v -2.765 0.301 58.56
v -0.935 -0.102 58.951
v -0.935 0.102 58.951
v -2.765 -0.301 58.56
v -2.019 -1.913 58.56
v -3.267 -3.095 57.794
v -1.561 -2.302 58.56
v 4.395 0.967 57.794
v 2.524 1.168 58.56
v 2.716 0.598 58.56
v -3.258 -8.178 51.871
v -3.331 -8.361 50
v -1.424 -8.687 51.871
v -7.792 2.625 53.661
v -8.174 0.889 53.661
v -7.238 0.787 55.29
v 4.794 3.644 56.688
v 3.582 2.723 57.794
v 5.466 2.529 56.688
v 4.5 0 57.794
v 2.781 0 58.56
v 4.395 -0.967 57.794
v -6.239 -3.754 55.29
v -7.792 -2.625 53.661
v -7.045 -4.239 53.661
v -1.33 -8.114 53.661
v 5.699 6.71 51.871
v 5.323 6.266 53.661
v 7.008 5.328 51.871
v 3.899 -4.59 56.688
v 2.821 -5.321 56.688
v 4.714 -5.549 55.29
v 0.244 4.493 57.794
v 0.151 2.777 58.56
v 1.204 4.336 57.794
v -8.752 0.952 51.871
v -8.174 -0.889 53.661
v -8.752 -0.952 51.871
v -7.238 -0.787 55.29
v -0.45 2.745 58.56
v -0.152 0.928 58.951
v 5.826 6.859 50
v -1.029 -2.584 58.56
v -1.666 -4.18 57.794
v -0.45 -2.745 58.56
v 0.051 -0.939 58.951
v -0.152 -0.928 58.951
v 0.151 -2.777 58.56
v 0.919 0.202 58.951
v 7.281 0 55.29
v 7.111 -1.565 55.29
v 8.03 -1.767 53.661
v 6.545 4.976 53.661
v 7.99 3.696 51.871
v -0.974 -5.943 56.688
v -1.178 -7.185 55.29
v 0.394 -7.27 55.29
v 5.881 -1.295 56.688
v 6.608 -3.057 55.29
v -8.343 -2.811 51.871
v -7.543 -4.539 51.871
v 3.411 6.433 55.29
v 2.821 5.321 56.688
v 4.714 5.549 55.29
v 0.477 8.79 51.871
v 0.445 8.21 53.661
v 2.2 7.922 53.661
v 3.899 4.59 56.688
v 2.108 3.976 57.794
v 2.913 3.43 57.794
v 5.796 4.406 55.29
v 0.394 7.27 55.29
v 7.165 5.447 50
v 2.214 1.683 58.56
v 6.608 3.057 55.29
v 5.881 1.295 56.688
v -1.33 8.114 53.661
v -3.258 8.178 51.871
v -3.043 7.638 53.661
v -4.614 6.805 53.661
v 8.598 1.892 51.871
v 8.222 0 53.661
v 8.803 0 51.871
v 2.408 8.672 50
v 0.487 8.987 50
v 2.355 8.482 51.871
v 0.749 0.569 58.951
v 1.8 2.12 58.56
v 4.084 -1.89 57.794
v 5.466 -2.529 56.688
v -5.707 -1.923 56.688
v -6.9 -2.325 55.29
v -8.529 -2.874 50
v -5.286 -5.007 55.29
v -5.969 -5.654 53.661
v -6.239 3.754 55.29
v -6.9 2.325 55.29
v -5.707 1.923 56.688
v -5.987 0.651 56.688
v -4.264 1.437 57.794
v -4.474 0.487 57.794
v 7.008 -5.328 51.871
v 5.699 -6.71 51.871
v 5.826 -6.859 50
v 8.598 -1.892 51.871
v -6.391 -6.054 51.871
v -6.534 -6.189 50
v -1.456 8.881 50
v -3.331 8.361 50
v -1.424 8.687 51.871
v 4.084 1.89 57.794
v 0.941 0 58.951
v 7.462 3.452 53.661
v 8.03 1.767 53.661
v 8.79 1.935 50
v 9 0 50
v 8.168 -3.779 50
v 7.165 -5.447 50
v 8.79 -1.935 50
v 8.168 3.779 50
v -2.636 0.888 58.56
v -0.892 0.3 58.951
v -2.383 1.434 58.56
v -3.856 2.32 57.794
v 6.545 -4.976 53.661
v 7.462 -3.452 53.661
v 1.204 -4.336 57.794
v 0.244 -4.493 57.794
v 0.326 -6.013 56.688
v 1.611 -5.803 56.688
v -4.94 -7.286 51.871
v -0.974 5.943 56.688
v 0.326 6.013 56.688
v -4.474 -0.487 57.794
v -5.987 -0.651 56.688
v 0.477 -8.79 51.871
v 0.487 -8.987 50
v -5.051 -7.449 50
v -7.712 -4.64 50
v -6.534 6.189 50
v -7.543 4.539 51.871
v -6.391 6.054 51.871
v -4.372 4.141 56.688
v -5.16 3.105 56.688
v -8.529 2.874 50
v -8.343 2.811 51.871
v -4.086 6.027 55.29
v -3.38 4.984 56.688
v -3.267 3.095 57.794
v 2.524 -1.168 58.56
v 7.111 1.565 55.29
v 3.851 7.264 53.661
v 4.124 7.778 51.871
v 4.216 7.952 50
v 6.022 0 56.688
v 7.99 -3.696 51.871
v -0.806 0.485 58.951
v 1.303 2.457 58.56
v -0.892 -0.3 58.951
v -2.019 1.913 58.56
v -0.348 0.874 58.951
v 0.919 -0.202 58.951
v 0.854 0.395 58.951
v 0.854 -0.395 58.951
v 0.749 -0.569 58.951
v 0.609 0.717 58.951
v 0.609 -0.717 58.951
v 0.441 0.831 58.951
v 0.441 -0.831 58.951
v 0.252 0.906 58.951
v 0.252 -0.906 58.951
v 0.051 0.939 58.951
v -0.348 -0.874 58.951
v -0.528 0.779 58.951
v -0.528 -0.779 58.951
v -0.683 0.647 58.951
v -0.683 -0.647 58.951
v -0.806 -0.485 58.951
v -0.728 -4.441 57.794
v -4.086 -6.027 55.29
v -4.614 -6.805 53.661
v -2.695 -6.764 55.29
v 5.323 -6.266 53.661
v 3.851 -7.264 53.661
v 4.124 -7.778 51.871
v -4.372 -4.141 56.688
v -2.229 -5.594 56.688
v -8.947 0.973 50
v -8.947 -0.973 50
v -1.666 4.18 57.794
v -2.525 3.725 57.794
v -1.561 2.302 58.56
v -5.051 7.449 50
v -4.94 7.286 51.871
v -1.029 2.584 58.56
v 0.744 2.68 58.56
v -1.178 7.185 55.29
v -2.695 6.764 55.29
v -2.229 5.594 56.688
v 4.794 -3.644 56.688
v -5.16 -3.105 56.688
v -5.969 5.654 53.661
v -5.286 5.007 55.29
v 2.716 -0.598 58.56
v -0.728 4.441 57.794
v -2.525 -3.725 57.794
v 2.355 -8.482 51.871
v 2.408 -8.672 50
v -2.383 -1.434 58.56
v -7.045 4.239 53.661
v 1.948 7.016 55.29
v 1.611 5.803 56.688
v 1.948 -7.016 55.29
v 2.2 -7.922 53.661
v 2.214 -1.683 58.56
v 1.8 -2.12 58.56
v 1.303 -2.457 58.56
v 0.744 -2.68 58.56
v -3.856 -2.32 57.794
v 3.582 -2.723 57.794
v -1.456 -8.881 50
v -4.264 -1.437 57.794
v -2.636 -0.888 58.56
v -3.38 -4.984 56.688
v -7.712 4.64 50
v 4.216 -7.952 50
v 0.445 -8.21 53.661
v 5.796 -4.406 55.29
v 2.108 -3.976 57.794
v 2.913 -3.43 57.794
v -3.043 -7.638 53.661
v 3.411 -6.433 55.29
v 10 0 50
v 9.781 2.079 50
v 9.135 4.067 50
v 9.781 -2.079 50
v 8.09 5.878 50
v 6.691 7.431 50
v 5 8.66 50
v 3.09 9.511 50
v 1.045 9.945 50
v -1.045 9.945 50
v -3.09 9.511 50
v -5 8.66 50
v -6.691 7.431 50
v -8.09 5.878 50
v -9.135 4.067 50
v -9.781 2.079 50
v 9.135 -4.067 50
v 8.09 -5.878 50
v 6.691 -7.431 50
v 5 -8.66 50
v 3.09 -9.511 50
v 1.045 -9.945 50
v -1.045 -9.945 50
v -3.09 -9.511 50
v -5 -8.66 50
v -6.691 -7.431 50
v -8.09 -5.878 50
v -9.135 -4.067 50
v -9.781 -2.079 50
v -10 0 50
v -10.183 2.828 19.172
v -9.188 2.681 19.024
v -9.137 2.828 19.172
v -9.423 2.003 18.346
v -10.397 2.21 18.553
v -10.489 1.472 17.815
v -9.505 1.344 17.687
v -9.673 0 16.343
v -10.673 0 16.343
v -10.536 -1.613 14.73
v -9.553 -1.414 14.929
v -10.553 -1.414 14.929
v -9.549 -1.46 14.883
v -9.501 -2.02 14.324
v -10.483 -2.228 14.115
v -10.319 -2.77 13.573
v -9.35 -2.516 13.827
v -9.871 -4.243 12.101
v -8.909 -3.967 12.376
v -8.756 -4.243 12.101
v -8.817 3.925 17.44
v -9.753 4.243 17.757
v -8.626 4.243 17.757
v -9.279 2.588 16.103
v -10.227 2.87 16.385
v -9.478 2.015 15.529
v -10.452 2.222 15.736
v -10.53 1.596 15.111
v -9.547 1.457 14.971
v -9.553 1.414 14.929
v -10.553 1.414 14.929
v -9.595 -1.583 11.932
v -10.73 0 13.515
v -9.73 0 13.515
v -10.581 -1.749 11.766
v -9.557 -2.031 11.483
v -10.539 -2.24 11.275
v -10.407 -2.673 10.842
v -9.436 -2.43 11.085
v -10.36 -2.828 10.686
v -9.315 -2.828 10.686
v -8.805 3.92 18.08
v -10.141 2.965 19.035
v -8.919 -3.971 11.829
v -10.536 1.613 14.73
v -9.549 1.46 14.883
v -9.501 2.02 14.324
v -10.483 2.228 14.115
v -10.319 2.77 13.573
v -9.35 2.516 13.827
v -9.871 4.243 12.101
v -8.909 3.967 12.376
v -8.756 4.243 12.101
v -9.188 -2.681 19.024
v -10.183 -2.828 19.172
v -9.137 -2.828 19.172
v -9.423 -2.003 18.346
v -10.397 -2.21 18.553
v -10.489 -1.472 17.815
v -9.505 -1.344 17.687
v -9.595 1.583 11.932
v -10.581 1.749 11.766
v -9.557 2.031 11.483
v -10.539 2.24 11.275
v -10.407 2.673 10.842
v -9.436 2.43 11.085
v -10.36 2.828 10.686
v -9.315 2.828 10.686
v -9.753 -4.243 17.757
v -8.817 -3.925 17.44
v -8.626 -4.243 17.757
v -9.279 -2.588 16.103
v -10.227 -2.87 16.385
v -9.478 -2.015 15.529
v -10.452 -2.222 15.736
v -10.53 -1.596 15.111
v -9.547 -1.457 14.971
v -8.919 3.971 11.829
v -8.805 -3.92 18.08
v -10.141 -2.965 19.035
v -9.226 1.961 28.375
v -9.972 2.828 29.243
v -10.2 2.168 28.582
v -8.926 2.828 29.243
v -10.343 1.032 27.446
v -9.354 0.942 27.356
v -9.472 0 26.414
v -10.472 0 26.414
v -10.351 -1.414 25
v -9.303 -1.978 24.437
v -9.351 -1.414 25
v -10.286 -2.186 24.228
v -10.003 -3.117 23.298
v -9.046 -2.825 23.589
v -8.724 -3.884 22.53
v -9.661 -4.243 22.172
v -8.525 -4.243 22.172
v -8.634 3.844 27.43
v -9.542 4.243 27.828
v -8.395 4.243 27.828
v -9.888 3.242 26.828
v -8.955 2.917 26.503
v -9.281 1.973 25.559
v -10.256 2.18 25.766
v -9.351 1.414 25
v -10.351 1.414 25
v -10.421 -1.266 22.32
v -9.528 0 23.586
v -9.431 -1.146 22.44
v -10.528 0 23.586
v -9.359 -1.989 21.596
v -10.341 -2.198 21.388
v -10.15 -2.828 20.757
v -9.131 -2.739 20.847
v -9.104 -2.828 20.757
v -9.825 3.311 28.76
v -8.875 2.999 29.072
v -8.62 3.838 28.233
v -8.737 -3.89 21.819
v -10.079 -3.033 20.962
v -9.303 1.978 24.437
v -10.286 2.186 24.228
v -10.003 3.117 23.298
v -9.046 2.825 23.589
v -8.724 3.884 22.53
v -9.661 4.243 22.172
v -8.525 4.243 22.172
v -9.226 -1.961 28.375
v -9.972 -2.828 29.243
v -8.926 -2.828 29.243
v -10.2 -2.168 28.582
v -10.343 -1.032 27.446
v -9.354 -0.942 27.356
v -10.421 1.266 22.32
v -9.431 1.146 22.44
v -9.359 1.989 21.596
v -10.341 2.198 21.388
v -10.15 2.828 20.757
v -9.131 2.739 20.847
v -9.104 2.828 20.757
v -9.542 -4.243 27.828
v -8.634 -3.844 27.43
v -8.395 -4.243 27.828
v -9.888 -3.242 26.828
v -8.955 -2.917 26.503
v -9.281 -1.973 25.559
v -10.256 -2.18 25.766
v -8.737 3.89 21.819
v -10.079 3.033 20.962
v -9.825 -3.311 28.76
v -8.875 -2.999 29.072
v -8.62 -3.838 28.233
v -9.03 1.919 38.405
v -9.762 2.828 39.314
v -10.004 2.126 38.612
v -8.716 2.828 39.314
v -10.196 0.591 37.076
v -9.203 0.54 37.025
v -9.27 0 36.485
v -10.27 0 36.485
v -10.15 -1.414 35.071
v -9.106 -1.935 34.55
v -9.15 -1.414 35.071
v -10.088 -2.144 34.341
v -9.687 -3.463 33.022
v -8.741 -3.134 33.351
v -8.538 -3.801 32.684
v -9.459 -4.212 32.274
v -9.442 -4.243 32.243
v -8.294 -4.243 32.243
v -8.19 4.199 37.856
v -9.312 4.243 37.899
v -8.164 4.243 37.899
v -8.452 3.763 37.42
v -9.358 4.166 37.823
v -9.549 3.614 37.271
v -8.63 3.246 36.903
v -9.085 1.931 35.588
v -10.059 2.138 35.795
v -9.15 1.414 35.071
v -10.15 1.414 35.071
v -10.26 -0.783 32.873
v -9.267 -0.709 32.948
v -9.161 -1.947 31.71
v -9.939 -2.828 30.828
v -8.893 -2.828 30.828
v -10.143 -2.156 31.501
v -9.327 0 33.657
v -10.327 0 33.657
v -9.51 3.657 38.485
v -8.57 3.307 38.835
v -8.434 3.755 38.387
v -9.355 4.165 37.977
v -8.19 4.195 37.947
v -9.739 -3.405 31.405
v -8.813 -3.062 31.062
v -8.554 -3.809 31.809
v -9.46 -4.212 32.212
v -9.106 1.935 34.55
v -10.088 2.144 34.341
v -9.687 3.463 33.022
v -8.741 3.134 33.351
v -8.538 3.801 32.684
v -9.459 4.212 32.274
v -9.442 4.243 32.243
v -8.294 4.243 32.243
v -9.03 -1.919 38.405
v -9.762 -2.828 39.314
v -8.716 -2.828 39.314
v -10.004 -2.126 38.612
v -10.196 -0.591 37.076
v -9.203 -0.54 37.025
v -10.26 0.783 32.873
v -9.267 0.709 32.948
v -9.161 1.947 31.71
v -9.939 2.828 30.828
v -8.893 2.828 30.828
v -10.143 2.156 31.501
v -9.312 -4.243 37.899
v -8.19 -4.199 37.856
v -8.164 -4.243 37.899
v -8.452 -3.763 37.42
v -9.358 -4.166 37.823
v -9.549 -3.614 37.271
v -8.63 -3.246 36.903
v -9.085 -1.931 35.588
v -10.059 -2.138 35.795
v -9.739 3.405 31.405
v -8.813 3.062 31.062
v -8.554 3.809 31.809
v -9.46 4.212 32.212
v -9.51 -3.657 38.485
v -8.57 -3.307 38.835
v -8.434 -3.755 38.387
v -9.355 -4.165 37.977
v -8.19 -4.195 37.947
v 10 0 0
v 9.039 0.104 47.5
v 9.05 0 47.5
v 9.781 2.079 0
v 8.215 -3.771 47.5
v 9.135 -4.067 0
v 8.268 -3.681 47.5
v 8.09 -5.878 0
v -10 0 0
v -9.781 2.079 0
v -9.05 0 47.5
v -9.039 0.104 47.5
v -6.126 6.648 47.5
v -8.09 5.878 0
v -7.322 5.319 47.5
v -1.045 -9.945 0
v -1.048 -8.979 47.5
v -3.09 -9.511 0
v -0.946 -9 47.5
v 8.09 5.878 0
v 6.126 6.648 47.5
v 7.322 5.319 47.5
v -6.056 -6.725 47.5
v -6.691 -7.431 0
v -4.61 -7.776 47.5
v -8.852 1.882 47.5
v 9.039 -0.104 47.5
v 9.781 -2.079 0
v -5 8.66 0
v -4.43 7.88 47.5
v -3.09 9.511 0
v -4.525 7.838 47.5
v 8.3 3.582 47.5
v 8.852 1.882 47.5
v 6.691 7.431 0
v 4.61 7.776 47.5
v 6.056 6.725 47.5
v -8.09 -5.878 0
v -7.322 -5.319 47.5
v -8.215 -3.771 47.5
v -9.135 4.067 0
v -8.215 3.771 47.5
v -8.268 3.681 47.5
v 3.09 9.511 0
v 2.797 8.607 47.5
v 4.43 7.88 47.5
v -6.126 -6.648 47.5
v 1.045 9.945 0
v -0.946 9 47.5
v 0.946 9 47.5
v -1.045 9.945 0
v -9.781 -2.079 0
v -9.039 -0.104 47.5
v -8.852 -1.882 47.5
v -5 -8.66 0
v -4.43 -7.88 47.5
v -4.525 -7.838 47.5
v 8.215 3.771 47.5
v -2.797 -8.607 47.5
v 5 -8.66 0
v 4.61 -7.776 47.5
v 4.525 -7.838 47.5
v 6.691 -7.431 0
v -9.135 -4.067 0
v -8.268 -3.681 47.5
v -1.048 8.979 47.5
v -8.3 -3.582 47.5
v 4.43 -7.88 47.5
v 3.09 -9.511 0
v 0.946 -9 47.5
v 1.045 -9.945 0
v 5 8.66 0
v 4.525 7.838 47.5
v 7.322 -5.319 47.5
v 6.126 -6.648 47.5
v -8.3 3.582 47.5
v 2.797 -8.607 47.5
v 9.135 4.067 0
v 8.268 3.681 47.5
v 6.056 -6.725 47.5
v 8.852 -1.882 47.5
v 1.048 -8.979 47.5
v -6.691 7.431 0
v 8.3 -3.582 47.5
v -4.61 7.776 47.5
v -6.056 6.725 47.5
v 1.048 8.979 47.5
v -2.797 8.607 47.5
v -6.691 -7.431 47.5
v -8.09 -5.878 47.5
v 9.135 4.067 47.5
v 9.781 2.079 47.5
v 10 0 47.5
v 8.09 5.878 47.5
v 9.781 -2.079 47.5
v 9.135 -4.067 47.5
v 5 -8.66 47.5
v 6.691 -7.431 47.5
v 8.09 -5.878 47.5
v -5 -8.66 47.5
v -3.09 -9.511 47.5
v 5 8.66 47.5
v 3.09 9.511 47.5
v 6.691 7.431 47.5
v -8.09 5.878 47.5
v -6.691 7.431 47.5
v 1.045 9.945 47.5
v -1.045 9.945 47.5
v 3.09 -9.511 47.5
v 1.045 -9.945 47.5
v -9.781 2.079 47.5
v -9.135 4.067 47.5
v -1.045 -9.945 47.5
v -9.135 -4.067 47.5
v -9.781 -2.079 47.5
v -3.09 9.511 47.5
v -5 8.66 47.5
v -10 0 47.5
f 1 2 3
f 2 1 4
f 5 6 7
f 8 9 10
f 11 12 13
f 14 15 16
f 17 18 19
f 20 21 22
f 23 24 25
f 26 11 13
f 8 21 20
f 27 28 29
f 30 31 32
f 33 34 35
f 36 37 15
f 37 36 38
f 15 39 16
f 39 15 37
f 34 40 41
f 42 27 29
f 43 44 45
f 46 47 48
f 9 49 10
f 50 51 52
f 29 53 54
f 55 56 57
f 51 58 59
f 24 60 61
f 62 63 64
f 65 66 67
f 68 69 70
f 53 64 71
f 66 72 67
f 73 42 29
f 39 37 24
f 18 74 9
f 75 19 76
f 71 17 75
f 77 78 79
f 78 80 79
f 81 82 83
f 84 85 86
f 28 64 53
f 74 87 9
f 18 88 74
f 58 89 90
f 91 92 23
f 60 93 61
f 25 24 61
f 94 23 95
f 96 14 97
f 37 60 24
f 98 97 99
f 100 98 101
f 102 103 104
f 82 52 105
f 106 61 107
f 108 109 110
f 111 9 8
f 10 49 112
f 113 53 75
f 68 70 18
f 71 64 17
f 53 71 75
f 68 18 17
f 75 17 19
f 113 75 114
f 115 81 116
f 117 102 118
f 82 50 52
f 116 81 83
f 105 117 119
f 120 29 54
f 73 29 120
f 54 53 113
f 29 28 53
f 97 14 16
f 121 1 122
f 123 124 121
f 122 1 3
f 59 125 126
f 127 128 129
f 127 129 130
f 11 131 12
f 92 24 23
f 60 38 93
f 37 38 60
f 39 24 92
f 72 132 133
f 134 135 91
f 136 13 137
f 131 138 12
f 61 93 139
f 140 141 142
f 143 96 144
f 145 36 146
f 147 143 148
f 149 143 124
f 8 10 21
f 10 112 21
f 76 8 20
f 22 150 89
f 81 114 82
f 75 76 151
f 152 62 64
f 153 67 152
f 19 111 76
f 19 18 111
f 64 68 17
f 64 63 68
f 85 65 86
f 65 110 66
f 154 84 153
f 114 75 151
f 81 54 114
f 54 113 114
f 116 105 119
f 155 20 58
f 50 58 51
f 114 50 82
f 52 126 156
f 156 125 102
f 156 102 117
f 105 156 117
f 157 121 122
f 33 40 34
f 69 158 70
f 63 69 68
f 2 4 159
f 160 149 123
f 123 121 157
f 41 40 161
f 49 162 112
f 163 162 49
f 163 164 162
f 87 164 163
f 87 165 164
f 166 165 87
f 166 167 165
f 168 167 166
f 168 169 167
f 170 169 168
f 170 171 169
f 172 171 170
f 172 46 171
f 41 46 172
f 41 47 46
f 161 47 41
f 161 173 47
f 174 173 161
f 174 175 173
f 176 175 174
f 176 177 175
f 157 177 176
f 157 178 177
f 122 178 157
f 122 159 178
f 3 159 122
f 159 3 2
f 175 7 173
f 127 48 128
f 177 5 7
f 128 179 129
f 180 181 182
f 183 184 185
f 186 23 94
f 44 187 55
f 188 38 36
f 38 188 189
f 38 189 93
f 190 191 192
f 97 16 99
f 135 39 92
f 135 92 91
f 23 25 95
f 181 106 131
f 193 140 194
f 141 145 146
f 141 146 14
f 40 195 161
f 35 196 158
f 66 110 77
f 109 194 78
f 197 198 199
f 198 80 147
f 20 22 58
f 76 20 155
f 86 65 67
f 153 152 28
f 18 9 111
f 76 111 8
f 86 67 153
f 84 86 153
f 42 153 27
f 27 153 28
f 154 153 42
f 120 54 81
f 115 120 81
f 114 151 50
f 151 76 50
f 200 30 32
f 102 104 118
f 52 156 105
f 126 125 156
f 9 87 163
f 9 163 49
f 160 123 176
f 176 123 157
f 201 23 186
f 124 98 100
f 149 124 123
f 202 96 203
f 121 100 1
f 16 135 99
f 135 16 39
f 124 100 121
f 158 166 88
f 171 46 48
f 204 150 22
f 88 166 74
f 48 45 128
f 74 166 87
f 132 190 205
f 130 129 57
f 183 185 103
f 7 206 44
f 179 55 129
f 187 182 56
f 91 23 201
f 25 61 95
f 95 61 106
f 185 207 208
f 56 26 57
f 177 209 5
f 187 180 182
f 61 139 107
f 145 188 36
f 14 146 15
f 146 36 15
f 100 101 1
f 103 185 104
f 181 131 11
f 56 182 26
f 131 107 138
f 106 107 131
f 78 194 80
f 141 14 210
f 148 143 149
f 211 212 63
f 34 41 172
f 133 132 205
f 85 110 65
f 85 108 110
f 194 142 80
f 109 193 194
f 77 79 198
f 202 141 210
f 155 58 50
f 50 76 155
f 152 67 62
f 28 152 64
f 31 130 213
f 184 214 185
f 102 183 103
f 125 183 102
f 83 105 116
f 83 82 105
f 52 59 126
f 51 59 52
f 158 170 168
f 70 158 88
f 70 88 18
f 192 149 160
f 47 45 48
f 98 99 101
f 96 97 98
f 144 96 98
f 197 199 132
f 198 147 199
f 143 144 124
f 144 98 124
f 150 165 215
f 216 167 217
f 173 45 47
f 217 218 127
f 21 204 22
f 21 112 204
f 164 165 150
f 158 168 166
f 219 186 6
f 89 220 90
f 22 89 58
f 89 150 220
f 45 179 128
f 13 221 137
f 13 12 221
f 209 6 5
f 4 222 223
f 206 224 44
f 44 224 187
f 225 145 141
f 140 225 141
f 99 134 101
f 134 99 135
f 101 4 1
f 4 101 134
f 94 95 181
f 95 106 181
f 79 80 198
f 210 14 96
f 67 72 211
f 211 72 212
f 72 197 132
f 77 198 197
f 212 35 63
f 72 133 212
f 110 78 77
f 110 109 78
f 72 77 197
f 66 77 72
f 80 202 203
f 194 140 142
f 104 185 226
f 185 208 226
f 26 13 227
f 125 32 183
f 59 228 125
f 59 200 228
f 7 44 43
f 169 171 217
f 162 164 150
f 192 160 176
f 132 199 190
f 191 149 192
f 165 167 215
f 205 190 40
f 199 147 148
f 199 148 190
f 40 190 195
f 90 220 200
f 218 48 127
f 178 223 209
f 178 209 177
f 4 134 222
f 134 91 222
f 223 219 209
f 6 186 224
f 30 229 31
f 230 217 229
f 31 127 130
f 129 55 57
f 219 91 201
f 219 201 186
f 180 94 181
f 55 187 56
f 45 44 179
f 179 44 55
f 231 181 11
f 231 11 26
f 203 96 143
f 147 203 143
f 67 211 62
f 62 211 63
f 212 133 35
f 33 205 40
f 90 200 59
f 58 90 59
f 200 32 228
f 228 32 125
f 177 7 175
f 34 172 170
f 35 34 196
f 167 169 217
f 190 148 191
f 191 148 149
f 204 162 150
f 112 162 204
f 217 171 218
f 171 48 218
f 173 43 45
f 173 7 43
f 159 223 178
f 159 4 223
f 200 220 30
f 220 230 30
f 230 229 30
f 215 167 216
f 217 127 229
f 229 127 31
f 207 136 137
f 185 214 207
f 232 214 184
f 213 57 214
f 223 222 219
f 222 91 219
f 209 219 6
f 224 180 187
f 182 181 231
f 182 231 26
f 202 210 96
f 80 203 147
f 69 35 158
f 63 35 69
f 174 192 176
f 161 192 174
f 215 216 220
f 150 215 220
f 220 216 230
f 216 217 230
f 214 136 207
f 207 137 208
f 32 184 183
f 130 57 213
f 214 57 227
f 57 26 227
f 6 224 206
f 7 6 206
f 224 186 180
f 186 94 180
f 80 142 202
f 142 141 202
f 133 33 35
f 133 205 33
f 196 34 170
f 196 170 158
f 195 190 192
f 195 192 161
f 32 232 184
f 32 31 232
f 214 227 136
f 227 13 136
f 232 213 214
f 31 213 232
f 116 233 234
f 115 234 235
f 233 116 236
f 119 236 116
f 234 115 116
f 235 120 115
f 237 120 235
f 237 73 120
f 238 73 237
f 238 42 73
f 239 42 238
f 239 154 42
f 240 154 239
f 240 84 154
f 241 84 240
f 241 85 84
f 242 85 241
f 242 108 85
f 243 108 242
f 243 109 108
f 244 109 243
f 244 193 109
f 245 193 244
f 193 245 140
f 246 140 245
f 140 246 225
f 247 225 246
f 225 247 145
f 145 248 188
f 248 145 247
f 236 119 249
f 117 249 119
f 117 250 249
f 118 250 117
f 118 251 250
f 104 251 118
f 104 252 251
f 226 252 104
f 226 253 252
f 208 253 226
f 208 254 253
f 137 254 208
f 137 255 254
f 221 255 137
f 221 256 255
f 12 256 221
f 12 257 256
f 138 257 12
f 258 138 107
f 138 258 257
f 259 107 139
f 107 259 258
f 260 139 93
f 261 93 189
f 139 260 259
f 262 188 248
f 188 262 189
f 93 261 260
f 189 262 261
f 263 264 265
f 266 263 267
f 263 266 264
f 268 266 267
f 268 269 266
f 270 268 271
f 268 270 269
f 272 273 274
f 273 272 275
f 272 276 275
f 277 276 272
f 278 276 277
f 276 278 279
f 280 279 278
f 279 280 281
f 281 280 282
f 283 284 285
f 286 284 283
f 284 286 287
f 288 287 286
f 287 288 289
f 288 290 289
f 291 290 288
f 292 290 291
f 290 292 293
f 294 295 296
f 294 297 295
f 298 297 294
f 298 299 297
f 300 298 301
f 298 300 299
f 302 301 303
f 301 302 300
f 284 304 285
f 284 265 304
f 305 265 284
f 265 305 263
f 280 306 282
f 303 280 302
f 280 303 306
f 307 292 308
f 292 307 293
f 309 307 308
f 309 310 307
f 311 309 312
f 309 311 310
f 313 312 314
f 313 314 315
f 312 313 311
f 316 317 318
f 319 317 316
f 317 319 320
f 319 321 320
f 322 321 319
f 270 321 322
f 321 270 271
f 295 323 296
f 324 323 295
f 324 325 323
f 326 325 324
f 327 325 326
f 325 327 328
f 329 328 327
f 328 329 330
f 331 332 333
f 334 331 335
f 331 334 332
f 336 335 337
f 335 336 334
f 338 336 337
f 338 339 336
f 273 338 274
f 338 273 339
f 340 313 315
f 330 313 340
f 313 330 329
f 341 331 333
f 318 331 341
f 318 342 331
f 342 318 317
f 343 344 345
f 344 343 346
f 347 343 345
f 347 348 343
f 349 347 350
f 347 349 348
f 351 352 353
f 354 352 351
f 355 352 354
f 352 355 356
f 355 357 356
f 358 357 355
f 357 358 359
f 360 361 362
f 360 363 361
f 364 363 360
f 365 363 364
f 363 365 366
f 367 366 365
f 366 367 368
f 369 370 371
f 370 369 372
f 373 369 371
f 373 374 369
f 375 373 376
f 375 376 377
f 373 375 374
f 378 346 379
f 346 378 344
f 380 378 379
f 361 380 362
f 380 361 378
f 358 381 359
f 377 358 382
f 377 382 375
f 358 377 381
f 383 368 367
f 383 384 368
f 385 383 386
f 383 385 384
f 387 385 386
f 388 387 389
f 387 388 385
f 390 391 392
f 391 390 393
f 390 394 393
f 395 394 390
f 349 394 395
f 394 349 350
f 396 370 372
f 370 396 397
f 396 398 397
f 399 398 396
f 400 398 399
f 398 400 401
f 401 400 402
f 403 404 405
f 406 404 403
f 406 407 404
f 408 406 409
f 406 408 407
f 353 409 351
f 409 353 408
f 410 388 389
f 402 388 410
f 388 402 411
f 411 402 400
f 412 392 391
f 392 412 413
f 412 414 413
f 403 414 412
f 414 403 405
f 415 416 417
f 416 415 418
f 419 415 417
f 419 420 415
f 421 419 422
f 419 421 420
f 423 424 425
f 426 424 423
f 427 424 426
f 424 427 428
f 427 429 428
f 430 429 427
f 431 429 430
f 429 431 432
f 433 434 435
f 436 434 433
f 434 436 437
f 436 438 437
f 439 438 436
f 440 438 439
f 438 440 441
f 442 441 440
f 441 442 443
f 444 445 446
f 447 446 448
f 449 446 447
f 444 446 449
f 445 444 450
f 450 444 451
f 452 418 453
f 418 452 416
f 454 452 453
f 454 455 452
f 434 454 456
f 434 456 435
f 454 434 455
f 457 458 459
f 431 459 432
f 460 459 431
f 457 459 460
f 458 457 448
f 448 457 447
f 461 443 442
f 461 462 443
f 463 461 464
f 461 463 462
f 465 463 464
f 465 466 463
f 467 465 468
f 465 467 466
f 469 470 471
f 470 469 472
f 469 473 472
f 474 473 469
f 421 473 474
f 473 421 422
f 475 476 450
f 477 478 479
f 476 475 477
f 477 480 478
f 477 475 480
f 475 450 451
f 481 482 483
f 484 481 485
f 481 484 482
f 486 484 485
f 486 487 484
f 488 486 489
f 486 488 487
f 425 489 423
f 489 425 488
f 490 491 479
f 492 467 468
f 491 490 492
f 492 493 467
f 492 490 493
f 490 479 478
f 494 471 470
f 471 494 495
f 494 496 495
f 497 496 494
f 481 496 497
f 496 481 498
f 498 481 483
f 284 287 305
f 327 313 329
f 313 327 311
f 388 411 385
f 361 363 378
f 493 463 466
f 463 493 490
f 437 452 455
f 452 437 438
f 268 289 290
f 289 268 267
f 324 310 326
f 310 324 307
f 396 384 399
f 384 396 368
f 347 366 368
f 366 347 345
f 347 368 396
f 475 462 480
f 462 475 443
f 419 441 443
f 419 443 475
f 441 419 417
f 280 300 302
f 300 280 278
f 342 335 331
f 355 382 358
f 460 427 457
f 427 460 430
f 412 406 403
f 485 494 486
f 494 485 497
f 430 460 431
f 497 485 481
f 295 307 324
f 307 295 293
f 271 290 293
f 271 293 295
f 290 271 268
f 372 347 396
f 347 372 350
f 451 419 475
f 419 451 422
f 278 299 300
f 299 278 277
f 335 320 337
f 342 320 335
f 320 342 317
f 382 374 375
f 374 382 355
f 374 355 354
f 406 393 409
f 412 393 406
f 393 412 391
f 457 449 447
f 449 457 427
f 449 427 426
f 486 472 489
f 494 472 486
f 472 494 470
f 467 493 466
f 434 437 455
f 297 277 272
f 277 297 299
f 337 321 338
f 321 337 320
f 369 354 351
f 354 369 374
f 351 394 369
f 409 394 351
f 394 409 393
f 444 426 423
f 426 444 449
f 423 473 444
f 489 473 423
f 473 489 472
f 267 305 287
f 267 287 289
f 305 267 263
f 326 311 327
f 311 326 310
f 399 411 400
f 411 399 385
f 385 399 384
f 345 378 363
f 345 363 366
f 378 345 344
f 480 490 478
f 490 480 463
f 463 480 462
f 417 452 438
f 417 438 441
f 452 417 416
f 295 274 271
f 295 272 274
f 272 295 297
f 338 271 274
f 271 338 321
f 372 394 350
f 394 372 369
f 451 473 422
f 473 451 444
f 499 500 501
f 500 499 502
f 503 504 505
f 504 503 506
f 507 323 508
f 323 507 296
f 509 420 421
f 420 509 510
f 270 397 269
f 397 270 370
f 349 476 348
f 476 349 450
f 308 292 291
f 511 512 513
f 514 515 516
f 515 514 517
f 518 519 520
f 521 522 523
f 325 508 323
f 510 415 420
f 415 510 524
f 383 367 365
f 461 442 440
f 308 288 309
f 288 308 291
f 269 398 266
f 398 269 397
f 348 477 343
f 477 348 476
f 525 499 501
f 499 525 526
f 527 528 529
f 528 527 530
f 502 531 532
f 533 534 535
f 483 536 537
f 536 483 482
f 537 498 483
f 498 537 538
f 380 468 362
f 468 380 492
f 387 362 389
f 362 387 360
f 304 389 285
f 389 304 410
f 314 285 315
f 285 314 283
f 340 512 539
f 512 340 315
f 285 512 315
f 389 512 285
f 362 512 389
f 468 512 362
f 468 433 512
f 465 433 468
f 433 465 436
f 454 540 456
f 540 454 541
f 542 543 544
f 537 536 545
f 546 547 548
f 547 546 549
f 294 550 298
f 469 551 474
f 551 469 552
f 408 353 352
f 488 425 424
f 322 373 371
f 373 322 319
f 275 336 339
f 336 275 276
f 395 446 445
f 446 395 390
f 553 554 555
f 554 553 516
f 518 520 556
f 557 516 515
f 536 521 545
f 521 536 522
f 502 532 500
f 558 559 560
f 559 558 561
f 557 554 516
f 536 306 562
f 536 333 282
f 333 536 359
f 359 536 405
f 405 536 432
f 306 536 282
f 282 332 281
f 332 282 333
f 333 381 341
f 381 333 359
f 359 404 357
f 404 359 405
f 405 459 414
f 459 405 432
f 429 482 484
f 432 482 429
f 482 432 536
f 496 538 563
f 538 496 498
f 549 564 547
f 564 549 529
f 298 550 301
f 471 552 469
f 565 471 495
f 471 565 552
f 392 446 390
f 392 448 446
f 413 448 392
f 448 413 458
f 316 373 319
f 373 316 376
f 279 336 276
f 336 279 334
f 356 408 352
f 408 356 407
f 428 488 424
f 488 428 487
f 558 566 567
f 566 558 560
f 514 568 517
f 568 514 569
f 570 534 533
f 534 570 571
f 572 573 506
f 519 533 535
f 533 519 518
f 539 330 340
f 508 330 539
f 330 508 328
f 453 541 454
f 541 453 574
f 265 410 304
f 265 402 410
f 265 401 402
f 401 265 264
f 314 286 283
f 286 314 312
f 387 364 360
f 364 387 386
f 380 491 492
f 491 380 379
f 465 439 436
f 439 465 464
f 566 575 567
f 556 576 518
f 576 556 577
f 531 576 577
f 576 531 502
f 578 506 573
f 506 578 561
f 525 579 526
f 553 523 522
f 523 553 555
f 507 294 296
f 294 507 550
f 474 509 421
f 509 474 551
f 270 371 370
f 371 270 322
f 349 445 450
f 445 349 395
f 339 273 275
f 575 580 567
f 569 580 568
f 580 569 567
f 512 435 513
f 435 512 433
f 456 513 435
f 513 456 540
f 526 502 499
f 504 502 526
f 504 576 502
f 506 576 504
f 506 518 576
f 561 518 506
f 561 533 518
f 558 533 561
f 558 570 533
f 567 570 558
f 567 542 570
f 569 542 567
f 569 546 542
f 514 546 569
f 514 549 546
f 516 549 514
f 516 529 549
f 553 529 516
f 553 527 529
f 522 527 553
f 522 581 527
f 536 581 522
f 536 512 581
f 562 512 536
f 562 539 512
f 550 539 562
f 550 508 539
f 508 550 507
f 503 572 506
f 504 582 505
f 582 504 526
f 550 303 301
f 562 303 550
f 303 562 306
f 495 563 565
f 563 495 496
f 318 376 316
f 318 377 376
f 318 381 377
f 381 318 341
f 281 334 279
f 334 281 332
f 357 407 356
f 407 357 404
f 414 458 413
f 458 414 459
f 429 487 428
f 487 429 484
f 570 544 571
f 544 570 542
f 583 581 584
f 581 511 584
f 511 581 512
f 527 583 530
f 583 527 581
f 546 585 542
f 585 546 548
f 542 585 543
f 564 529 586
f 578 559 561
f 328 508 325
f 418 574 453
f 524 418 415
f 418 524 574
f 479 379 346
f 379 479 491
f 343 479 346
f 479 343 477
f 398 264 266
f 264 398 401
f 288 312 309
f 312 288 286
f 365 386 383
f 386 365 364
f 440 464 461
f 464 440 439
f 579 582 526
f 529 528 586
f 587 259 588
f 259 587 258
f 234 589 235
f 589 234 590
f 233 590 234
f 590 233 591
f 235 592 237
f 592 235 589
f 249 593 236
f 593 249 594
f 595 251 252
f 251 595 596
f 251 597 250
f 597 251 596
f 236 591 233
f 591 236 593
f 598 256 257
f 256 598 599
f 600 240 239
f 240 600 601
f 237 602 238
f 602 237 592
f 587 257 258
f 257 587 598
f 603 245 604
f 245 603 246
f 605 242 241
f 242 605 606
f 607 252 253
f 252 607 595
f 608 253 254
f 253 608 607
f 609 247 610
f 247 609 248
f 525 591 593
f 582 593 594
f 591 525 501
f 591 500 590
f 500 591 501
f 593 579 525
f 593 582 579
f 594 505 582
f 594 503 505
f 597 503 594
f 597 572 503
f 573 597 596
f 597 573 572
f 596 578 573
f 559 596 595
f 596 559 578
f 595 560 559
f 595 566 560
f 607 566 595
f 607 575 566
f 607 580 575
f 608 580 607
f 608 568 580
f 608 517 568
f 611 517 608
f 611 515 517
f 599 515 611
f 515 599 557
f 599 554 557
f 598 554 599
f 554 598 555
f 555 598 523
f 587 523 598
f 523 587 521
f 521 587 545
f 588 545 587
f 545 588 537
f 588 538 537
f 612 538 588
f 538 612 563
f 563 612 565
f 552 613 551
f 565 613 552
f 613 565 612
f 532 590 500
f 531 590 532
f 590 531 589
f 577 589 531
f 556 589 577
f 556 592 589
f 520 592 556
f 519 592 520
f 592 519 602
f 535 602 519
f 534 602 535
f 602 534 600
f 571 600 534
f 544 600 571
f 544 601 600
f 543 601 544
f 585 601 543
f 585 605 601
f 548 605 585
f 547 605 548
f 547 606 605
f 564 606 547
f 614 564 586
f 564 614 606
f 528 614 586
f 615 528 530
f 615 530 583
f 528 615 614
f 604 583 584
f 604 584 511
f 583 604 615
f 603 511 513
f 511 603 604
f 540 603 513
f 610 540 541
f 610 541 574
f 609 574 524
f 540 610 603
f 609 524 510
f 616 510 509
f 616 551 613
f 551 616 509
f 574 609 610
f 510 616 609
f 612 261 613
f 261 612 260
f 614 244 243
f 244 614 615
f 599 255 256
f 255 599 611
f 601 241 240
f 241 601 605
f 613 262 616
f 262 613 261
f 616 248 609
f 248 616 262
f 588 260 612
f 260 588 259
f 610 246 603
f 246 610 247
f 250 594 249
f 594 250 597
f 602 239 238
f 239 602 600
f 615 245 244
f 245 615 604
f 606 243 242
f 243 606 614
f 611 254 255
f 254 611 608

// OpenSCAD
r1=10;
r2=9;
h=50;
rimheight=2.5;
rim=1;
xthickness=2;
xsize=10;
xdepth=1;
xdistance=3;

union(){
	cylinder(r1=r1,r2=r2,h=h);
	translate([0,0,h])
	intersection(){
		sphere(r=r2);
		translate([0,0,r2]) cube([2,2,2]*r2,center=true);
	}
	translate([0,0,h-rimheight/2]) cylinder(r=r2+rim,h=rimheight,center=true);

	intersection(){
		cylinder(r1=r1+xdepth,r2=r2+xdepth,h=h);
		translate([0,0,h/2])
		for(i=[-1:1])
			translate([0,0,(xsize/1.4142135623730951+xdistance)*i])
			rotate([90,0,-90]) for(j=[0,90]) rotate([0,0,45+j]) translate([0,0,r1*5])
				cube([xthickness,xsize,r1*10],center=true);
	}
}
